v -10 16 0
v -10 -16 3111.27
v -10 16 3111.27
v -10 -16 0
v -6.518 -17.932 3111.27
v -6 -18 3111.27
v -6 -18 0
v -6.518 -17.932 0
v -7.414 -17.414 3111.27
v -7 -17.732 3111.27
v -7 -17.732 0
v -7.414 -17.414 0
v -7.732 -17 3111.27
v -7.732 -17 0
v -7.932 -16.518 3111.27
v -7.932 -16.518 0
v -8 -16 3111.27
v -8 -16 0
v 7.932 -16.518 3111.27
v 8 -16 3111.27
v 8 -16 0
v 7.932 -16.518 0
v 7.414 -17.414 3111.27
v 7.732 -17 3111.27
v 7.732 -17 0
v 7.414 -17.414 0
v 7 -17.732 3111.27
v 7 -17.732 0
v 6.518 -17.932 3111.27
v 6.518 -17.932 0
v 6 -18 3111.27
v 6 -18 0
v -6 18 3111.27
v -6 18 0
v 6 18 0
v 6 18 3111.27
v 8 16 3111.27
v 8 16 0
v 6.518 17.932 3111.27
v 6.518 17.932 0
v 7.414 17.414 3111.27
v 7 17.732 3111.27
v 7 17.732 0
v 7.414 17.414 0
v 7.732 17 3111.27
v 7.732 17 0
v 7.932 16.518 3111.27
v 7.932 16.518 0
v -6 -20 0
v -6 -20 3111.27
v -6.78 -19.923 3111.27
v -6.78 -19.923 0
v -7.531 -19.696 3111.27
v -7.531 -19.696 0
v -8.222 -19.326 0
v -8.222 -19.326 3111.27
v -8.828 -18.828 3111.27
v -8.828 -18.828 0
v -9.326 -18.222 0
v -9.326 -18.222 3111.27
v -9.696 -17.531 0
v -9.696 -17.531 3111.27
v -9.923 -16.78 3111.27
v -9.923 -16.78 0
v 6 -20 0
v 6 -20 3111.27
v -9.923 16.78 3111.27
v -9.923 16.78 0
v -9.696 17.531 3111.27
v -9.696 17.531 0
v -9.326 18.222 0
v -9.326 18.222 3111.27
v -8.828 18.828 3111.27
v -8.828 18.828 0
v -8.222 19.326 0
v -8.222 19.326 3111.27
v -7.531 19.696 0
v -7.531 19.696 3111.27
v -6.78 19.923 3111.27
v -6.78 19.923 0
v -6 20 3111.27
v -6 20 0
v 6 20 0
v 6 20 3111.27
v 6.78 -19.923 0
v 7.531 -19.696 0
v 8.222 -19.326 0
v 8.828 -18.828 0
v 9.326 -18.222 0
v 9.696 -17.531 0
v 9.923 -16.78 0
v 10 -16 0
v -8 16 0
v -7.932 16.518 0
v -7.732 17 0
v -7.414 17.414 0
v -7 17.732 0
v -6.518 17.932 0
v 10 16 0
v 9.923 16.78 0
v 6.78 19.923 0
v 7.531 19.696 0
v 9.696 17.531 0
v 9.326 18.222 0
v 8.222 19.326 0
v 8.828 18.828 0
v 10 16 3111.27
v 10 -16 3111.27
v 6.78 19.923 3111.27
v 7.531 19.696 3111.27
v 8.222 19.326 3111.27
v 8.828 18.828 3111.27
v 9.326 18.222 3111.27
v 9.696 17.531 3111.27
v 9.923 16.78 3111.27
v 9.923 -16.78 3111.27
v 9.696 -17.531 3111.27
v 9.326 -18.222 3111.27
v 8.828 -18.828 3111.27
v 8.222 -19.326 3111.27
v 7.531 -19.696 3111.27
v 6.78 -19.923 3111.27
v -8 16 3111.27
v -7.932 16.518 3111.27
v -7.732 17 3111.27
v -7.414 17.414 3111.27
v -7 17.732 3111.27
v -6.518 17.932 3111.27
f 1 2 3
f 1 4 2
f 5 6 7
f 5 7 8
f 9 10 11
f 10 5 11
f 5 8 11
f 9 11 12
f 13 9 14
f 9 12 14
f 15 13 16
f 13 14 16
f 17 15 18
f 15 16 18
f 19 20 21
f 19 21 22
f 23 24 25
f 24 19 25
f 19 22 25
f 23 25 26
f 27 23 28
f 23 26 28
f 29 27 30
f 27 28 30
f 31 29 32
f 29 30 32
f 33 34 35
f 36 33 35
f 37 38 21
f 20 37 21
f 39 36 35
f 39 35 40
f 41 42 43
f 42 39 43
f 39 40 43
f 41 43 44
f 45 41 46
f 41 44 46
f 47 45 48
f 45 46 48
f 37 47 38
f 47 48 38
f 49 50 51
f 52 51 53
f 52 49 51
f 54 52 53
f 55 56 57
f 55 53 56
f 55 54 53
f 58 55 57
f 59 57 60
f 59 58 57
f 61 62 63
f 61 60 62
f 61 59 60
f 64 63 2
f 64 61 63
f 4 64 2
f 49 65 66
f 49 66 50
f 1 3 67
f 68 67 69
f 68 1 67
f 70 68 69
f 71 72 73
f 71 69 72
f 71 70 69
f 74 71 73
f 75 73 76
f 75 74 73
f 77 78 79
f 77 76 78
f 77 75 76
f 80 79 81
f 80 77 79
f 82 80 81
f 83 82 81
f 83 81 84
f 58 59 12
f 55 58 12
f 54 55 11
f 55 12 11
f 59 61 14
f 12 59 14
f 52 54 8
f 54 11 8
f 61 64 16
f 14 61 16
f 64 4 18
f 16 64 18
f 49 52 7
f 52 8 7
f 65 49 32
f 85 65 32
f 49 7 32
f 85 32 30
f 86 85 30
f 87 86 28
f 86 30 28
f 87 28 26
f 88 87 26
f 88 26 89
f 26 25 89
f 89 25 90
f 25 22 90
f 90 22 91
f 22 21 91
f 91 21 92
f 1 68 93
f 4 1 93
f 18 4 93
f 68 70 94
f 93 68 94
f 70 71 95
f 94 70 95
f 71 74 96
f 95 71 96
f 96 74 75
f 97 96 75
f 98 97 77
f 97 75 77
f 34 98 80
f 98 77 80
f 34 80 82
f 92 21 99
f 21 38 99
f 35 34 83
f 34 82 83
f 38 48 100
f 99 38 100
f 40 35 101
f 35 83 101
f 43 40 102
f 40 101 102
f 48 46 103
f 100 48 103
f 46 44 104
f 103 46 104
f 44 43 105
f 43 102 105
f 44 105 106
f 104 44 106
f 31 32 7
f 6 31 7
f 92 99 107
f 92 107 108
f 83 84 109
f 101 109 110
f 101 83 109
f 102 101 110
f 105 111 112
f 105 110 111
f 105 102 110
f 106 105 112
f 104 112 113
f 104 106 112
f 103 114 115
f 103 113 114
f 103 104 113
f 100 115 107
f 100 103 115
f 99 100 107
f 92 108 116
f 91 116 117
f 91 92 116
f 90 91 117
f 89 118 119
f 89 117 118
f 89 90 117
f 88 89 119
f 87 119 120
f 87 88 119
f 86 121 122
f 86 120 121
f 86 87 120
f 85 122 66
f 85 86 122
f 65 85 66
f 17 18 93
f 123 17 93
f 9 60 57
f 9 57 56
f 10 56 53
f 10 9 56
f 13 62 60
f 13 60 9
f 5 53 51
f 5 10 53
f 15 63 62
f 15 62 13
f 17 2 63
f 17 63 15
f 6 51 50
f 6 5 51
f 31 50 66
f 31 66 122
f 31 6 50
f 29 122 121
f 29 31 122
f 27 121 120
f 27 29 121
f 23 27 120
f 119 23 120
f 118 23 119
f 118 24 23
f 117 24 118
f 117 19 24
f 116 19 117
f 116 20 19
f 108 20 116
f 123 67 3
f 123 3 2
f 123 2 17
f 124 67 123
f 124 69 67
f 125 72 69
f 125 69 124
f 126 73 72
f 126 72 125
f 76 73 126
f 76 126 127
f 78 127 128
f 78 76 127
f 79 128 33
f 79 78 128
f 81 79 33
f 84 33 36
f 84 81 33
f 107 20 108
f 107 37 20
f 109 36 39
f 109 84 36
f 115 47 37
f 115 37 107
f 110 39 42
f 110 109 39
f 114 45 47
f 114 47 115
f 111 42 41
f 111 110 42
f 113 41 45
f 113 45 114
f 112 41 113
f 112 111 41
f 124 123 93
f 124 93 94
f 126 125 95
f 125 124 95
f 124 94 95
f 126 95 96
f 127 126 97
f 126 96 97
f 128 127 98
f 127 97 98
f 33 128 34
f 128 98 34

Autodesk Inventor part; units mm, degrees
ref_plane "YZ Plane" through (0, 0, 0) normal (1, 0, 0) x (0, 1, 0)
ref_plane "Start Plane" through (0, 0, 0) normal (0, 0, 1) x (1, 0, 0)
ref_plane "End Plane" through (0, 0, 3111.2698) normal (0, 0, 1) x (1, 0, 0)
sketch "Sketch" plane through (0, 0, 0) normal (0, 0, 1) x (1, 0, 0)
  line L0 (-10, -16) -> (-10, 16)
  line L1 (-6, 20) -> (6, 20)
  line L2 (10, 16) -> (10, -16)
  line L3 (6, -20) -> (-6, -20)
  arc A0 (-10, -16) -> (-6, -20) centre (-6, -16) ccw
  arc A1 (10, 16) -> (6, 20) centre (6, 16) ccw
  arc A2 (-6, 20) -> (-10, 16) centre (-6, 16) ccw
  arc A3 (6, -20) -> (10, -16) centre (6, -16) ccw
  arc A4 (-6, 18) -> (-8, 16) centre (-6, 16) ccw
  line L4 (-6, 18) -> (6, 18)
  arc A5 (8, 16) -> (6, 18) centre (6, 16) ccw
  line L5 (8, 16) -> (8, -16)
  arc A6 (6, -18) -> (8, -16) centre (6, -16) ccw
  line L6 (6, -18) -> (-6, -18)
  arc A7 (-8, -16) -> (-6, -18) centre (-6, -16) ccw
  line L7 (-8, -16) -> (-8, 16)
  line L8 (0, 29.1598) -> (0, -29.1598) construction
  line L9 (-15.1598, 0) -> (15.1598, 0) construction
  dimension "d7" = 4
  dimension "d9" = 20
  dimension "d11" = 40
  dimension "d12" = 2
  dimension "d15" = 10
  dimension "d16" = 20
extrude "Body" add sketch "Sketch" along normal up to surface (3111.2698 mm away) from surface at 0
sketch "Sketch3" plane through (0, 0, 0) normal (0, 0, 1) x (1, 0, 0)
  line L0 (0, 0) -> (10, 0)
ref_plane "Work Plane3" through (0, 0, 0) normal (0, -1, 0) x (1, 0, 0)
sketch "Sketch4" plane through (0, 0, 0) normal (0, -1, 0) x (1, 0, 0)
  line L0 (-2, 0) -> (12, 0) projected
  line L1 (-2, 3111.2698) -> (12, 3111.2698) projected
  dimension "d18" = 3111.2698
equation "\"d7\" = G_IR"
equation "\"d9\" = G_W"
equation "\"d11\" = G_H"
equation "\"d12\" = G_T"
equation "\"d15\" = 0.5 * d9"
equation "\"d16\" = 0.5 * d11"
equation "\"d3\" = G_L"
equation "\"G_W\" = 20"
equation "\"G_H\" = 40"
equation "\"G_T\" = 2"
equation "\"G_IR\" = 4"
equation "\"G_L\" = d18"
equation "\"G_OFFSET_START\" = 0"
equation "\"G_OFFSET_END\" = 0"
equation "\"d14\" = G_OFFSET_END + B_L"
equation "\"B_L\" = 3111.26984"
properties part number "ISO 10799-2 - 40x20x2 - 3111,27" material "Steel, Mild"
